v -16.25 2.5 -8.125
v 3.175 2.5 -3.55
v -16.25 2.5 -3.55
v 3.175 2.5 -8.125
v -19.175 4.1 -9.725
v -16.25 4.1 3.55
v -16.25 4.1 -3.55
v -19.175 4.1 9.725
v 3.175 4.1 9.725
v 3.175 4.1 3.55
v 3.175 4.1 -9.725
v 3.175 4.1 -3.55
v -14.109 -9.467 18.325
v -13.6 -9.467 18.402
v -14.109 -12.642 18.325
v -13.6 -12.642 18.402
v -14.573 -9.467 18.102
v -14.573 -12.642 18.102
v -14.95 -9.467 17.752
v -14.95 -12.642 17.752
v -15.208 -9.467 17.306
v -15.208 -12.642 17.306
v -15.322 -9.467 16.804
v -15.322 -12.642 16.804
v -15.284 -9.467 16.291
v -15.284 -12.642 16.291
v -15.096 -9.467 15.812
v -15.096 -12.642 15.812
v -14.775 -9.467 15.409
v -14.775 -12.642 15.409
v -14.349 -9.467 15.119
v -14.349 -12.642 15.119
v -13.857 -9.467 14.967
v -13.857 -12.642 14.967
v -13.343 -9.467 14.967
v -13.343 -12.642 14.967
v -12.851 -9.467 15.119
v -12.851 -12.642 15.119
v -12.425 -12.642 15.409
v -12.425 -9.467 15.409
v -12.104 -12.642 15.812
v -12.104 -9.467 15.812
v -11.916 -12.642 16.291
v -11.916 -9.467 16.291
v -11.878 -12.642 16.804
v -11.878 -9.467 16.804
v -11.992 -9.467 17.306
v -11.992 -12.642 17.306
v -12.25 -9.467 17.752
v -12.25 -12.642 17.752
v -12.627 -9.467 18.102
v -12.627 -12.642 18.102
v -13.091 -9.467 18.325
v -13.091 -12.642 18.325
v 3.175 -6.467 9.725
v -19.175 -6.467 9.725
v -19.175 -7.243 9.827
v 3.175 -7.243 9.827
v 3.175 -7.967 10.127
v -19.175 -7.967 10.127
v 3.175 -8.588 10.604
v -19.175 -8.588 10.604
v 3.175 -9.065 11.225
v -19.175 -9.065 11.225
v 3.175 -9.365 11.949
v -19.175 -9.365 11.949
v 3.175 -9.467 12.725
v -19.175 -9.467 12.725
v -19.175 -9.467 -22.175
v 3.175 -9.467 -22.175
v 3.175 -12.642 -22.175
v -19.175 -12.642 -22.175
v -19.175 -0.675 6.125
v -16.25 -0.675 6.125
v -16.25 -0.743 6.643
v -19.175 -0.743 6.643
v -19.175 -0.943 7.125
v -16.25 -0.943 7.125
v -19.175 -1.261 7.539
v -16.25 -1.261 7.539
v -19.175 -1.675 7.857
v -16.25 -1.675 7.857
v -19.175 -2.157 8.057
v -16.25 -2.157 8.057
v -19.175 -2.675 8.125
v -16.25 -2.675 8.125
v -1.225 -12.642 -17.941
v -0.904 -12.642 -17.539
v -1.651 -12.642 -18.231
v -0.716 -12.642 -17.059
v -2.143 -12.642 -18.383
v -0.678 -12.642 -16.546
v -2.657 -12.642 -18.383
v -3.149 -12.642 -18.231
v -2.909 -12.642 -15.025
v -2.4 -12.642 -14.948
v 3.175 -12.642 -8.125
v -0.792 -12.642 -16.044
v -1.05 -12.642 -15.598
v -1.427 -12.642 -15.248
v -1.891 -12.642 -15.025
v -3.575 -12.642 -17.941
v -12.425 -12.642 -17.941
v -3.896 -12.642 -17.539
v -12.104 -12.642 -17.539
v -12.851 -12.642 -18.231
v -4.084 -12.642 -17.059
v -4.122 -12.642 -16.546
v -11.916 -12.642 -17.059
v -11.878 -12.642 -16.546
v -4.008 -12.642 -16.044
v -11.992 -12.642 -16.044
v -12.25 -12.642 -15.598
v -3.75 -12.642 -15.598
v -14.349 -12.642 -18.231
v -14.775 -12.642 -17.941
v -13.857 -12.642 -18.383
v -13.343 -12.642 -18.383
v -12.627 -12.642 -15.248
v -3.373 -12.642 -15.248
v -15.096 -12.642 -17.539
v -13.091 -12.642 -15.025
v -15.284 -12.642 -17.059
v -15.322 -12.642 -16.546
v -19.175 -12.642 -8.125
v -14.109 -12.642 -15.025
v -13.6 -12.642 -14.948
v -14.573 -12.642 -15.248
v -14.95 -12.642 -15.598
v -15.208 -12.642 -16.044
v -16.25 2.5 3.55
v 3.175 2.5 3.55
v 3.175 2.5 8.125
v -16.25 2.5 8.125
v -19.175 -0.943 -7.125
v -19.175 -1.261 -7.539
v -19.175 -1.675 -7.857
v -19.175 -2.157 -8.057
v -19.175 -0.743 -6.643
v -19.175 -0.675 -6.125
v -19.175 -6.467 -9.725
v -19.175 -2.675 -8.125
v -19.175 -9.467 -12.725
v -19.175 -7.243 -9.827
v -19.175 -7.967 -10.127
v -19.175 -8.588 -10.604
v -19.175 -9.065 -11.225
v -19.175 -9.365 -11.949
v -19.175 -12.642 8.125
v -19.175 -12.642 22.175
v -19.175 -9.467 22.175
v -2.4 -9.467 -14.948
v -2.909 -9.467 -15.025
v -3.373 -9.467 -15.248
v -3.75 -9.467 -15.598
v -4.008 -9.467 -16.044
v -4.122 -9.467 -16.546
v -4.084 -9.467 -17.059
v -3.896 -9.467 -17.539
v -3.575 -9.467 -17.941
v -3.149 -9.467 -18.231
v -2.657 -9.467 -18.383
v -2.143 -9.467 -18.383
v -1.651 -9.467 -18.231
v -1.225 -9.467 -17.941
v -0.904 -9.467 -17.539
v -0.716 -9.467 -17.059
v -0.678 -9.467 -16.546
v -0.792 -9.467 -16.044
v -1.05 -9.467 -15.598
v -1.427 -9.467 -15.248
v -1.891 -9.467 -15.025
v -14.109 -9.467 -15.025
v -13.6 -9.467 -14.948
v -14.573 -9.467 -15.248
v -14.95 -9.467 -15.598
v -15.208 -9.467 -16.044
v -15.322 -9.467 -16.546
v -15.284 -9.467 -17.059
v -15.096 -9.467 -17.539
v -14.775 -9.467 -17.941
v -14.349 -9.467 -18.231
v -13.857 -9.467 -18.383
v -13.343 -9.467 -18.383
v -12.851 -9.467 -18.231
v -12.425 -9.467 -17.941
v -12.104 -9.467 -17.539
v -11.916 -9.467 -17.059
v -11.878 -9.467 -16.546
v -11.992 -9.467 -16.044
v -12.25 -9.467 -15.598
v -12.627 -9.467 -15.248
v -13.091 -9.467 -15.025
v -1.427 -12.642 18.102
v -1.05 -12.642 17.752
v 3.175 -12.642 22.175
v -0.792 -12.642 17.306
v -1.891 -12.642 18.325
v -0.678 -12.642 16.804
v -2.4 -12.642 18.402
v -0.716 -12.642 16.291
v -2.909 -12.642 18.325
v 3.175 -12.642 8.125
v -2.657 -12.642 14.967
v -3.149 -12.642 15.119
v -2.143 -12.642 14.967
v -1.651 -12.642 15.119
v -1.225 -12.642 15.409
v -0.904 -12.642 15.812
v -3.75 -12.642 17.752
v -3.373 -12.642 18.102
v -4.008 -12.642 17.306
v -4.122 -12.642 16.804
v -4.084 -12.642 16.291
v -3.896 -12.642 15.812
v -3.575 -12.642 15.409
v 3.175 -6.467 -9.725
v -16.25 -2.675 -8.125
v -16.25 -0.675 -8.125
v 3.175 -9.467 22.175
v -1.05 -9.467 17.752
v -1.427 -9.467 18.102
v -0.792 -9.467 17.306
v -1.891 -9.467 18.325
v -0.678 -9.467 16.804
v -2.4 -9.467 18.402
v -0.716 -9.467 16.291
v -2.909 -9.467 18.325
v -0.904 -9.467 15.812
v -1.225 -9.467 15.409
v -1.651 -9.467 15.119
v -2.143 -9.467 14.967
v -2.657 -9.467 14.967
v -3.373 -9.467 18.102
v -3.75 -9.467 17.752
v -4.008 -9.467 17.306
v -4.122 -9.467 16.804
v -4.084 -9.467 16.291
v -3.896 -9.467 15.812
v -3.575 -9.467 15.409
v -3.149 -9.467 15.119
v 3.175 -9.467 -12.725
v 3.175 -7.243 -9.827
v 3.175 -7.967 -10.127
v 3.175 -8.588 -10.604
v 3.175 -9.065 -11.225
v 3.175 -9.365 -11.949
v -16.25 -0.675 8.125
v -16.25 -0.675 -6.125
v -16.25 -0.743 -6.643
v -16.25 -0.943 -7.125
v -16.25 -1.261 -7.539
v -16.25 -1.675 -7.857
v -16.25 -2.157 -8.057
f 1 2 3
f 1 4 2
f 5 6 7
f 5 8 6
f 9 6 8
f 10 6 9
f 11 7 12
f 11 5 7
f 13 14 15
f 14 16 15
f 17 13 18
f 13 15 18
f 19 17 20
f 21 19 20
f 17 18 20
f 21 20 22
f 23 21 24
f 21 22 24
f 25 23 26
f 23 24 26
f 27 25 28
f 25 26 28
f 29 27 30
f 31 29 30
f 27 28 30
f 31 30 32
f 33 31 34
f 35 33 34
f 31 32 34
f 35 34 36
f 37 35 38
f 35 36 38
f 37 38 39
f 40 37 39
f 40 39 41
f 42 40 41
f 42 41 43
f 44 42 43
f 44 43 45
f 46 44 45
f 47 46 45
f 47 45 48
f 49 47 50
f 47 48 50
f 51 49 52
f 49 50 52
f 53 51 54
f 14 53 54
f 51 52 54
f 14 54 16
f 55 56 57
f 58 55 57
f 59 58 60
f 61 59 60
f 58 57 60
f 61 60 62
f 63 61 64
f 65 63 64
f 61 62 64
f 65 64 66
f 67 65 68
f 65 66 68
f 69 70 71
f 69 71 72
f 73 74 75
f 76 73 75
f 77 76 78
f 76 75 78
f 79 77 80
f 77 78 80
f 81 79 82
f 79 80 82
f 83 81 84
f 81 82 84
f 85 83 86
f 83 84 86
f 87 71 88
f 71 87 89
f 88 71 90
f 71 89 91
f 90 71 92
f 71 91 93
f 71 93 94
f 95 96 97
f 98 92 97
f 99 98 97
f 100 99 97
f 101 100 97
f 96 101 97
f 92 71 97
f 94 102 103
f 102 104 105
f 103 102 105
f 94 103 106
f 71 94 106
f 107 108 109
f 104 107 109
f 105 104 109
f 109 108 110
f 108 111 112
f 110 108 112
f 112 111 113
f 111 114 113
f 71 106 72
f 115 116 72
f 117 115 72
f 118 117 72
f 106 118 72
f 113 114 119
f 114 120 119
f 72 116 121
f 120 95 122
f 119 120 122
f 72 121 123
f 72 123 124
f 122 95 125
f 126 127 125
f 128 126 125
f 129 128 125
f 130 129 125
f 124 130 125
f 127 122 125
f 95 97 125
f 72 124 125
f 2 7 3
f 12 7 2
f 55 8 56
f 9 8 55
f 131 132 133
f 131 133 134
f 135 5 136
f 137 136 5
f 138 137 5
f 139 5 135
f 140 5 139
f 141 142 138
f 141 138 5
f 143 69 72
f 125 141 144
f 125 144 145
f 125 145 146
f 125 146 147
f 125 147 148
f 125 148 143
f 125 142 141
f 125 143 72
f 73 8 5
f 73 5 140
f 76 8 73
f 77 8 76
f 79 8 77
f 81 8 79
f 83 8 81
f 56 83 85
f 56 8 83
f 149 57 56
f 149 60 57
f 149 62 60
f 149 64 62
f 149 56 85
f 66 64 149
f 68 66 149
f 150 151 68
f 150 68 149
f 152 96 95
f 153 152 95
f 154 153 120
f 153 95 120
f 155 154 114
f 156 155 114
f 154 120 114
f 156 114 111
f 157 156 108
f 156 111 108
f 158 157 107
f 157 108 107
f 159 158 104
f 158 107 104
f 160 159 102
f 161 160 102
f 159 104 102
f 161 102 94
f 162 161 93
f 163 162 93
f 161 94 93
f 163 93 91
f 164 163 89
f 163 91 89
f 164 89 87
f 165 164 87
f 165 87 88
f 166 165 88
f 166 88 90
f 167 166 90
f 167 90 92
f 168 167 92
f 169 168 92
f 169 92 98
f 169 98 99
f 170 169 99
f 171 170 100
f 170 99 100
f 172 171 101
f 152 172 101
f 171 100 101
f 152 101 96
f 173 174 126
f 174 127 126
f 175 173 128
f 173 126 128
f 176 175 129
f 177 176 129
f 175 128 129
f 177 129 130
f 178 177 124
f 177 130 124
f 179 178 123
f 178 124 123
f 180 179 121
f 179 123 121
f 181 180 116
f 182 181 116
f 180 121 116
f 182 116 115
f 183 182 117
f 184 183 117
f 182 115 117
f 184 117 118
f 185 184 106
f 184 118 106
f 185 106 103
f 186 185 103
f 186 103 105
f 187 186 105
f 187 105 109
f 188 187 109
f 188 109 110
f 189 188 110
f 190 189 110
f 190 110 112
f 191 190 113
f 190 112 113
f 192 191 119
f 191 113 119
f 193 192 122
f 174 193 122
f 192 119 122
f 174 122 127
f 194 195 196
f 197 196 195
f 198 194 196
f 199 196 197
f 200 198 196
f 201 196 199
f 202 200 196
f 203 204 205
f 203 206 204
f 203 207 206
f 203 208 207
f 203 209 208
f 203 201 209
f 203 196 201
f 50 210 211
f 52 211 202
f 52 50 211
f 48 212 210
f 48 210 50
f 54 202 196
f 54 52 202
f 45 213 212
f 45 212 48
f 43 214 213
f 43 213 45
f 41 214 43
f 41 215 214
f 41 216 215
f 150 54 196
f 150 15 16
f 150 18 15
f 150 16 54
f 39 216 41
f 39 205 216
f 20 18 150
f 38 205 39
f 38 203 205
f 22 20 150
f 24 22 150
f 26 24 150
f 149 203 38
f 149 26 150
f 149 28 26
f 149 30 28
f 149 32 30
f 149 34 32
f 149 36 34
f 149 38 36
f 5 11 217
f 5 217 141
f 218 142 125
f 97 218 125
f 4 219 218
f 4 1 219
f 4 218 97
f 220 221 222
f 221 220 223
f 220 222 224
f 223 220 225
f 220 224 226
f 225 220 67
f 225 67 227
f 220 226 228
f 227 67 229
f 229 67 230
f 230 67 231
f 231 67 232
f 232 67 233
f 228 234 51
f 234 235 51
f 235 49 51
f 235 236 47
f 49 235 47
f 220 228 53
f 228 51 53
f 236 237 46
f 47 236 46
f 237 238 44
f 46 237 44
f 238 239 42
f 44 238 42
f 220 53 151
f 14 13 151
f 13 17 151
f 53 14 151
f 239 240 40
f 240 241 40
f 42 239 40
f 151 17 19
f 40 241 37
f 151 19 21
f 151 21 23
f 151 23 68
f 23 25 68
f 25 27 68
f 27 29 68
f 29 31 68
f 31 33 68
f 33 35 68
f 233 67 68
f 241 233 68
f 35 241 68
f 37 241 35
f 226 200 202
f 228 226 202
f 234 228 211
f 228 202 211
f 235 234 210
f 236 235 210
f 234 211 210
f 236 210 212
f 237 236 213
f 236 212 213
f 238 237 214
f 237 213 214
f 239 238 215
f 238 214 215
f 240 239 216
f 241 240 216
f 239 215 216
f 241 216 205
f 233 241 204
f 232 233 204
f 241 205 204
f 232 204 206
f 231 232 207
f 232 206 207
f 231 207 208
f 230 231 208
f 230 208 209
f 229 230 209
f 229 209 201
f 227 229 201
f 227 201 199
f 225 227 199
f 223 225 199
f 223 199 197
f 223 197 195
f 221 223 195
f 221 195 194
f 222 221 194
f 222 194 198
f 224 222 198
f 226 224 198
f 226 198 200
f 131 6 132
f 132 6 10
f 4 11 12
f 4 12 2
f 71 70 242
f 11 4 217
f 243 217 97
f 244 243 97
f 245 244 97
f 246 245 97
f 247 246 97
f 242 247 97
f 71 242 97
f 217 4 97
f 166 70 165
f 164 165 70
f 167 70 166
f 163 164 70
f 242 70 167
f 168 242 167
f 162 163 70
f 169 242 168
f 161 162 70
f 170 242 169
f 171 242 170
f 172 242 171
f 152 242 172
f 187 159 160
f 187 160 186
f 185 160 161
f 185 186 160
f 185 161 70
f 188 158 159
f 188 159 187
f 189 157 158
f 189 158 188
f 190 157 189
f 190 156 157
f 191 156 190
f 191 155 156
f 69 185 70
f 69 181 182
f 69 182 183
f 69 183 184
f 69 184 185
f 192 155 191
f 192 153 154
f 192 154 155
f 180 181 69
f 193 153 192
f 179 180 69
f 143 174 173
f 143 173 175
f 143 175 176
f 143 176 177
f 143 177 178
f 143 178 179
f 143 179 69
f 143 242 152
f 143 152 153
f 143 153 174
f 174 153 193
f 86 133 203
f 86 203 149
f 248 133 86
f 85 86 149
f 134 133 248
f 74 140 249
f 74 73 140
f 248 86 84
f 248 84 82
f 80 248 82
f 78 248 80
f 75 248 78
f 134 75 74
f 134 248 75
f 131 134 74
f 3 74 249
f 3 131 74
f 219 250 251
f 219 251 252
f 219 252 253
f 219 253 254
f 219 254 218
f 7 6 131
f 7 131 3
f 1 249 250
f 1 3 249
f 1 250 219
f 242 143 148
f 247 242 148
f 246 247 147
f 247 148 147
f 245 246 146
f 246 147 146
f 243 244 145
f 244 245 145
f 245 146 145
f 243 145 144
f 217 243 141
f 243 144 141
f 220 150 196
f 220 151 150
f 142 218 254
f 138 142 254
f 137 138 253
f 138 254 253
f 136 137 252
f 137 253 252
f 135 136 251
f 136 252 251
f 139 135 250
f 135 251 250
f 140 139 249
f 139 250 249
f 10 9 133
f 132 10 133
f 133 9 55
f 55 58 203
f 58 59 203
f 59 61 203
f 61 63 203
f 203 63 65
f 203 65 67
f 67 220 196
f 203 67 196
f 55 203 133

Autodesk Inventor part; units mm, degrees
ref_plane "YZ Plane" through (0, 0, 0) normal (1, 0, 0) x (0, 1, 0)
ref_plane "XZ Plane" through (0, 0, 0) normal (0, 1, 0) x (-1, 0, 0)
ref_plane "XY Plane" through (0, 0, 0) normal (0, 0, 1) x (1, 0, 0)
sketch "Sketch1" plane through (0, 0, 0) normal (1, 0, 0) x (0, 1, 0)
  line L0 (2.5, 8) -> (-2.5, -8) construction
  line L1 (-2.5, 8) -> (2.5, -8) construction
  line L2 (2.5, 8) -> (2.5, 3.55)
  line L3 (2.5, -8) -> (2.5, -3.55)
  line L4 (-2.5, 0) -> (0.675, 0)
  line L5 (2.5, 8) -> (8.85, 8)
  line L6 (8.85, 8) -> (8.85, -8)
  line L7 (8.85, -8) -> (2.5, -8)
  arc A0 (2.5, -3.55) -> (2.5, 3.55) centre (0.675, 0) ccw
  line L8 (2.5, -8) -> (2.5, -3.55)
  line L9 (2.5, 3.55) -> (2.5, 8)
  point P0 (0, 0)
  dimension "d0" = 5
  dimension "d1" = 16
  dimension "d2" = 4.45
  dimension "d4" = 3.175
  dimension "d7" = 6.35
extrude "Extrusion1" add sketch "Sketch1" along normal blind 3.175
sketch "Sketch2" plane through (0, 0, 0) normal (-1, 0, 0) x (0, 0, 1)
  line L0 (-8, 8.85) -> (8, 8.85) projected
  line L1 (8, 2.5) -> (3.55, 2.5) projected
  line L2 (-8, 8.85) -> (8, 8.85)
  line L3 (8, 8.85) -> (8, 2.5)
  line L4 (8, 2.5) -> (-8, 2.5)
  line L5 (-8, 2.5) -> (-8, 8.85)
  point P0 (0, 0)
extrude "Extrusion2" add sketch "Sketch2" along normal blind 16
sketch "Sketch3" plane through (-16, 0, 0) normal (-1, 0, 0) x (0, 0, 1)
  line L0 (-8, 2.5) -> (-8, 8.85) projected
  line L1 (8, 2.5) -> (3.55, 2.5) projected
  line L2 (-8, 8.85) -> (8, 8.85)
  line L3 (8, 8.85) -> (8, 2.5)
  line L4 (8, 2.5) -> (-8, 2.5)
  line L5 (-8, 2.5) -> (-8, 8.85)
  point P0 (0, 0)
extrude "Extrusion3" add sketch "Sketch3" along normal blind 3.175
sketch "Sketch4" plane through (3.175, 2.5, 3.55) normal (0, -1, 0) x (1, 0, 0)
  line L0 (-22.35, -11.55) -> (-22.35, 4.45) projected
  line L1 (-3.175, -7.1) -> (0, -7.1) projected
  line L2 (-19.175, 0) -> (-3.175, 0)
  line L3 (-3.175, 0) -> (-3.175, -7.1)
  line L4 (-3.175, -7.1) -> (-19.175, -7.1)
  line L5 (-19.175, -7.1) -> (-19.175, 0)
  line L6 (-19.175, 0) -> (-3.175, -7.1) construction
  line L7 (-3.175, 0) -> (-19.175, -7.1) construction
  point P0 (-3.175, -3.55)
extrude "Extrusion4" cut sketch "Sketch4" against normal through all
sketch "Sketch5" plane through (-16, 2.5, 3.55) normal (1, 0, 0) x (0, 0, -1)
  line L0 (0, 6.35) -> (7.1, 6.35) projected
  line L1 (0, 0) -> (7.1, 0)
  line L2 (7.1, 0) -> (7.1, 6.35)
  line L3 (7.1, 6.35) -> (0, 6.35)
  line L4 (0, 6.35) -> (0, 0)
  point P0 (3.55, -2.5)
extrude "Extrusion5" cut sketch "Sketch5" against normal blind 0.25
sketch "Sketch6" plane through (0, 0.675, 0) normal (-1, 0, 0) x (0, 0, 1)
  line L0 (-3.55, 1.825) -> (-3.55, 8.175) projected
  line L1 (3.55, 1.825) -> (3.55, 8.175) projected
  line L2 (-3.55, 1.825) -> (3.55, 1.825)
  line L3 (3.55, 1.825) -> (3.55, 8.175)
  line L4 (3.55, 8.175) -> (-3.55, 8.175)
  line L5 (-3.55, 8.175) -> (-3.55, 1.825)
  point P0 (0, -0.675)
extrude "Extrusion6" cut sketch "Sketch6" against normal blind 0.25
sketch "Sketch7" plane through (3.175, 2.5, 8) normal (0, 0, 1) x (1, 0, 0)
  line L0 (-22.35, 6.35) -> (0, 6.35)
  line L1 (0, 6.35) -> (0, 0)
  line L2 (0, 0) -> (-22.35, 0)
  line L3 (-22.35, 0) -> (-22.35, 6.35)
  point P0 (-3.175, -2.5)
extrude "Extrusion7" add sketch "Sketch7" along normal blind 3.175
sketch "Sketch8" plane through (3.175, 2.5, -8) normal (0, 0, -1) x (-1, 0, 0)
  line L0 (0, 6.35) -> (22.35, 6.35) projected
  line L1 (22.35, 6.35) -> (22.35, 0) projected
  line L2 (0, 6.35) -> (22.35, 6.35)
  line L3 (22.35, 6.35) -> (22.35, 0)
  line L4 (22.35, 0) -> (0, 0)
  line L5 (0, 0) -> (0, 6.35)
  point P0 (3.175, -2.5)
extrude "Extrusion8" add sketch "Sketch8" along normal blind 3.175
sketch "Sketch9" plane through (-16.25, 2.5, -3.55) normal (0, -1, 0) x (1, 0, 0)
  line L0 (19.425, -7.625) -> (-2.925, -7.625) projected
  line L1 (-2.925, 14.725) -> (-2.925, -7.625) projected
  line L2 (19.425, -7.625) -> (-2.925, -7.625)
  line L3 (-2.925, -7.625) -> (-2.925, -4.45)
  line L4 (-2.925, -4.45) -> (19.425, -4.45)
  line L5 (19.425, -4.45) -> (19.425, -7.625)
  line L6 (19.425, 7.1) -> (19.425, 14.725) projected
  line L7 (-2.925, 14.725) -> (19.425, 14.725)
  line L8 (19.425, 14.725) -> (19.425, 11.55)
  line L9 (19.425, 11.55) -> (-2.925, 11.55)
  line L10 (-2.925, 11.55) -> (-2.925, 14.725)
  point P0 (16.25, 3.55)
  dimension "d26" = 3.175
  dimension "d27" = 3.175
extrude "Extrusion9" add sketch "Sketch9" along normal blind 15.142
sketch "Sketch10" plane through (3.175, 2.5, 11.175) normal (0, 0, 1) x (1, 0, 0)
  line L0 (0, -15.142) -> (-22.35, -15.142) projected
  line L1 (0, 0) -> (0, -15.142) projected
  line L2 (-22.35, -15.142) -> (0, -15.142)
  line L3 (0, -15.142) -> (0, -11.967)
  line L4 (0, -11.967) -> (-22.35, -11.967)
  line L5 (-22.35, -11.967) -> (-22.35, -15.142)
  point P0 (-3.175, -2.5)
  dimension "d30" = 3.175
extrude "Extrusion10" add sketch "Sketch10" along normal blind 5.715
sketch "Sketch11" plane through (3.175, 2.5, -11.175) normal (0, 0, -1) x (-1, 0, 0)
  line L0 (22.35, -15.142) -> (0, -15.142) projected
  line L1 (22.35, 0) -> (22.35, -15.142) projected
  line L2 (0, -15.142) -> (22.35, -15.142)
  line L3 (22.35, -15.142) -> (22.35, -11.967)
  line L4 (22.35, -11.967) -> (0, -11.967)
  line L5 (0, -11.967) -> (0, -15.142)
  point P0 (3.175, -2.5)
  dimension "d33" = 3.175
extrude "Extrusion11" add sketch "Sketch11" along normal blind 5.715
chamfer "Chamfer1" [suppressed]
sketch "Sketch14" plane through (3.175, 2.5, 16.89) normal (0, 0, 1) x (1, 0, 0)
  line L0 (0, -11.967) -> (-22.35, -11.967) projected
  line L1 (0, 0) -> (0, -15.142) projected
  line L2 (-22.35, -11.967) -> (0, -11.967)
  line L3 (0, -11.967) -> (0, -15.142)
  line L4 (0, -15.142) -> (-22.35, -15.142)
  line L5 (-22.35, -15.142) -> (-22.35, -11.967)
  point P0 (-3.175, -2.5)
extrude "Extrusion12" add sketch "Sketch14" along normal blind 5.285
sketch "Sketch15" plane through (3.175, 2.5, -16.89) normal (0, 0, -1) x (-1, 0, 0)
  line L0 (0, -11.967) -> (0, -15.142) projected
  line L1 (0, -15.142) -> (22.35, -15.142) projected
  line L2 (0, -11.967) -> (22.35, -11.967)
  line L3 (22.35, -11.967) -> (22.35, -15.142)
  line L4 (22.35, -15.142) -> (0, -15.142)
  line L5 (0, -15.142) -> (0, -11.967)
  point P0 (3.175, -2.5)
extrude "Extrusion13" add sketch "Sketch15" along normal blind 5.285
sketch "Sketch16" plane through (-19.175, -9.467, -11.175) normal (0, 1, 0) x (1, 0, 0)
  point P0 (19.175, -11.175)
chamfer "Chamfer2" distance 3 angle 45 2 edges at (-8, 8.85, 11.175) (-8, 8.85, -11.175)
sketch "Sketch20" plane through (-19.175, 2.5, -8) normal (0, 0, 1) x (1, 0, 0)
  line L0 (0, -15.142) -> (22.35, -15.142)
  line L1 (22.35, -15.142) -> (22.35, 0)
  line L2 (22.35, 0) -> (0, 0)
  line L3 (0, 0) -> (0, -15.142)
  point P0 (19.175, -2.5)
extrude "Extrusion17" cut sketch "Sketch20" against normal blind 0.125
sketch "Sketch21" plane through (3.175, 2.5, 8) normal (0, 0, -1) x (-1, 0, 0)
  line L0 (22.35, 0) -> (22.35, -15.142) projected
  line L1 (0, 0) -> (0, -15.142) projected
  line L2 (22.35, -15.142) -> (0, -15.142)
  line L3 (0, -15.142) -> (0, 0)
  line L4 (0, 0) -> (22.35, 0)
  line L5 (22.35, 0) -> (22.35, -15.142)
  point P0 (3.175, -2.5)
  point P1 (0, -15.142)
extrude "Extrusion18" cut sketch "Sketch21" against normal blind 0.125
sketch "Sketch22" plane through (-19.175, 8.85, -8.175) normal (0, 1, 0) x (1, 0, 0)
  line L0 (19.425, -11.725) -> (22.35, -11.725) projected
  line L1 (19.425, -4.625) -> (22.35, -4.625) projected
  line L2 (19.425, -11.725) -> (22.35, -11.725)
  line L3 (22.35, -11.725) -> (22.35, -4.625)
  line L4 (22.35, -4.625) -> (19.425, -4.625)
  line L5 (19.425, -4.625) -> (19.425, -11.725)
  point P0 (19.175, -8.175)
extrude "Extrusion19" cut sketch "Sketch22" against normal through all
sketch "Sketch23" plane through (-19.175, -9.467, 11.175) normal (0, 1, 0) x (1, 0, 0)
  line L0 (0, 0) -> (0, -11) projected
  line L1 (22.35, 0) -> (22.35, -11) projected
  point P0 (19.175, 11.175)
  point P1 (5.575, -5.5)
  point P2 (16.775, -5.5)
sketch "Sketch24" plane through (-19.175, -9.467, -11.175) normal (0, 1, 0) x (1, 0, 0)
  line L0 (22.35, 0) -> (22.35, 11) projected
  line L1 (0, 0) -> (0, 11) projected
  point P0 (19.175, -11.175)
  point P1 (16.775, 5.5)
  point P2 (5.575, 5.5)
hole "Hole1" at (-13.6, -9.467, -16.675) direction (0, -1, 0) diameter 3.454 end through all clearance for "Flat Head Machine Screw (82)" size "#4" standard "Ansi Unified Screw Threads"
hole "Hole2" at (-2.4, -9.467, -16.675) direction (0, -1, 0) diameter 3.454 end through all clearance for "Flat Head Machine Screw (82)" size "#4" standard "Ansi Unified Screw Threads"
hole "Hole3" at (-2.4, -9.467, 16.675) direction (0, -1, 0) diameter 3.454 end through all clearance for "Flat Head Machine Screw (82)" size "#4" standard "Ansi Unified Screw Threads"
hole "Hole4" at (-13.6, -9.467, 16.675) direction (0, -1, 0) diameter 3.454 end through all clearance for "Flat Head Machine Screw (82)" size "#4" standard "Ansi Unified Screw Threads"
sketch "Sketch25" plane through (3.175, 0, 0) normal (1, 0, 0) x (0, 0, -1)
  line L0 (3.55, 5.0908) -> (8.175, 5.0908)
  line L1 (8.175, 8.85) -> (-8.175, 8.85) projected
  line L2 (8.175, 5.0908) -> (8.175, 8.85)
  line L3 (8.175, 8.85) -> (3.55, 8.85)
  line L4 (3.55, 8.85) -> (8.175, 8.85)
  line L5 (8.175, 8.85) -> (8.175, 5.0908)
  line L6 (8.175, 5.0908) -> (3.55, 5.0908)
  line L7 (3.55, 5.0908) -> (3.55, 8.85)
  point P0 (0, 0)
  point P1 (3.55, 2.5)
  dimension "d102" = 2.5908
extrude "Extrusion20" [suppressed]
chamfer "Chamfer3" [suppressed]
sketch "Sketch26" plane through (3.175, 0, 0) normal (1, 0, 0) x (0, 0, -1)
  line L0 (3.55, 2.5) -> (-3.55, 2.5) projected
  line L1 (-3.55, 2.5) -> (-3.55, 5.675)
  line L2 (-3.55, 2.5) -> (-3.55, 8.85) projected
  line L3 (-3.55, 5.675) -> (-11.175, 5.675)
  line L4 (-11.175, 5.85) -> (-11.175, -9.467) projected
  line L5 (-11.175, 5.85) -> (-8.175, 8.85)
  line L6 (-8.175, 8.85) -> (-3.55, 8.85)
  line L7 (3.55, 8.85) -> (3.55, 2.5) projected
  line L8 (3.55, 2.5) -> (3.55, 5.675)
  line L9 (3.55, 5.675) -> (11.175, 5.675)
  line L10 (11.175, 5.85) -> (11.175, -9.467) projected
  line L11 (11.175, 5.85) -> (8.175, 8.85)
  line L12 (11.175, 5.85) -> (8.175, 8.85) projected
  line L13 (8.175, 8.85) -> (3.55, 8.85)
  line L14 (3.55, 8.85) -> (3.55, 5.675)
  point P0 (0, 0)
  dimension "d109" = 3.175
  dimension "d110" = 3.175
extrude "Extrusion21" cut sketch "Sketch26" against normal through all
sketch "Sketch27" plane through (-19.175, 8.85, -3.55) normal (0, 1, 0) x (1, 0, 0)
  line L0 (2.925, 0) -> (2.925, -7.1) projected
  line L1 (0, 0) -> (2.925, 0)
  line L2 (2.925, 0) -> (2.925, -7.1)
  line L3 (2.925, -7.1) -> (0, -7.1)
  line L4 (0, -7.1) -> (0, 0)
  point P0 (19.175, -3.55)
extrude "Extrusion22" cut sketch "Sketch27" against normal blind 3.175
sketch "Sketch28" plane through (-16.25, 2.5, -3.55) normal (0, -1, 0) x (1, 0, 0)
  line L0 (-2.925, 11.675) -> (-2.925, -4.575) projected
  line L1 (-2.925, -4.575) -> (19.425, -4.575) projected
  line L2 (-2.925, 11.675) -> (0, 11.675)
  line L3 (0, 11.675) -> (0, -4.575)
  line L4 (0, -4.575) -> (-2.925, -4.575)
  line L5 (-2.925, -4.575) -> (-2.925, 11.675)
  point P0 (16.25, 3.55)
  dimension "d115" = 2.925
extrude "Extrusion23" add sketch "Sketch28" along normal blind 3.175
chamfer "Chamfer4" [suppressed]
sketch "Sketch29" plane through (-16.25, -12.642, -3.55) normal (0, -1, 0) x (1, 0, 0)
  line L0 (-2.925, 11.675) -> (19.425, 11.675) projected
  line L1 (19.425, -4.575) -> (-2.925, -4.575) projected
  line L2 (19.425, 11.675) -> (-2.925, 11.675)
  line L3 (-2.925, 11.675) -> (-2.925, -4.575)
  line L4 (-2.925, -4.575) -> (19.425, -4.575)
  line L5 (19.425, -4.575) -> (19.425, 11.675)
  point P0 (16.25, 3.55)
extrude "Extrusion24" [suppressed]
sketch "Sketch30" plane through (-16.25, -12.642, -3.55) normal (0, -1, 0) x (1, 0, 0)
  line L0 (-2.925, 11.675) -> (19.425, 11.675) projected
  line L1 (-2.925, -4.575) -> (-2.925, -18.625) projected
  line L2 (19.425, 11.675) -> (-2.925, 11.675)
  line L3 (-2.925, 11.675) -> (-2.925, -4.575)
  line L4 (-2.925, -4.575) -> (19.425, -4.575)
  line L5 (19.425, -4.575) -> (19.425, 11.675)
  point P0 (16.25, 3.55)
extrude "Extrusion25" [suppressed]
sketch "Sketch31" plane through (3.175, 5.675, 11.175) normal (0, 1, 0) x (1, 0, 0)
  line L0 (-19.425, 14.725) -> (-19.425, 7.625) projected
  line L1 (0, 14.725) -> (-19.425, 14.725)
  line L2 (-19.425, 14.725) -> (-19.425, 7.625)
  line L3 (-19.425, 7.625) -> (0, 7.625) projected
  line L4 (-19.425, 7.625) -> (0, 7.625)
  line L5 (0, 7.625) -> (0, 0)
  line L6 (0, 0) -> (-22.35, 0) projected
  line L7 (0, 0) -> (-22.35, 0)
  line L8 (-22.35, 0) -> (-22.35, 22.35) projected
  line L9 (-22.35, 0) -> (-22.35, 22.35)
  line L10 (-22.35, 22.35) -> (0, 22.35)
  line L11 (0, 22.35) -> (0, 14.725)
  point P0 (-3.175, 11.175)
extrude "Extrusion26" cut sketch "Sketch31" against normal blind 0.5
sketch "Sketch32" plane through (3.175, 5.175, 11.175) normal (0, 1, 0) x (1, 0, 0)
  line L0 (0, 22.35) -> (-22.35, 22.35) projected
  line L1 (-22.35, 0) -> (0, 0) projected
  line L2 (-22.35, 22.35) -> (0, 22.35)
  line L3 (0, 22.35) -> (0, 0)
  line L4 (0, 0) -> (-22.35, 0)
  line L5 (-22.35, 0) -> (-22.35, 22.35)
  point P0 (-3.175, 11.175)
extrude "Extrusion27" cut sketch "Sketch32" against normal blind 1.075
sketch "Sketch33" plane through (3.175, 2.5, 11.175) normal (0, 0, 1) x (1, 0, 0)
  line L0 (-22.35, 1.6) -> (0, 1.6) projected
  line L1 (0, -11.967) -> (0, -15.142) projected
  line L2 (-22.35, 1.6) -> (0, 1.6)
  line L3 (0, 1.6) -> (0, -11.967)
  line L4 (0, -11.967) -> (-22.35, -11.967)
  line L5 (-22.35, -11.967) -> (-22.35, 1.6)
  point P0 (-3.175, -2.5)
extrude "Extrusion28" cut sketch "Sketch33" against normal blind 1.45
sketch "Sketch34" plane through (3.175, 2.5, -11.175) normal (0, 0, -1) x (-1, 0, 0)
  line L0 (0, -11.967) -> (22.35, -11.967) projected
  line L1 (22.35, 1.6) -> (0, 1.6) projected
  line L2 (22.35, -11.967) -> (0, -11.967)
  line L3 (0, -11.967) -> (0, 1.6)
  line L4 (0, 1.6) -> (22.35, 1.6)
  line L5 (22.35, 1.6) -> (22.35, -11.967)
  point P0 (3.175, -2.5)
extrude "Extrusion29" cut sketch "Sketch34" against normal blind 1.45
fillet "Fillet1" radius 3 2 edges at (-8, -9.467, 9.725) (-8, -9.467, -9.725)
fillet "Fillet2" radius 2 2 edges at (-17.7125, -0.675, -8.125) (-17.7125, -0.675, 8.125)
properties part number "peltierclip_ledgereod2"
